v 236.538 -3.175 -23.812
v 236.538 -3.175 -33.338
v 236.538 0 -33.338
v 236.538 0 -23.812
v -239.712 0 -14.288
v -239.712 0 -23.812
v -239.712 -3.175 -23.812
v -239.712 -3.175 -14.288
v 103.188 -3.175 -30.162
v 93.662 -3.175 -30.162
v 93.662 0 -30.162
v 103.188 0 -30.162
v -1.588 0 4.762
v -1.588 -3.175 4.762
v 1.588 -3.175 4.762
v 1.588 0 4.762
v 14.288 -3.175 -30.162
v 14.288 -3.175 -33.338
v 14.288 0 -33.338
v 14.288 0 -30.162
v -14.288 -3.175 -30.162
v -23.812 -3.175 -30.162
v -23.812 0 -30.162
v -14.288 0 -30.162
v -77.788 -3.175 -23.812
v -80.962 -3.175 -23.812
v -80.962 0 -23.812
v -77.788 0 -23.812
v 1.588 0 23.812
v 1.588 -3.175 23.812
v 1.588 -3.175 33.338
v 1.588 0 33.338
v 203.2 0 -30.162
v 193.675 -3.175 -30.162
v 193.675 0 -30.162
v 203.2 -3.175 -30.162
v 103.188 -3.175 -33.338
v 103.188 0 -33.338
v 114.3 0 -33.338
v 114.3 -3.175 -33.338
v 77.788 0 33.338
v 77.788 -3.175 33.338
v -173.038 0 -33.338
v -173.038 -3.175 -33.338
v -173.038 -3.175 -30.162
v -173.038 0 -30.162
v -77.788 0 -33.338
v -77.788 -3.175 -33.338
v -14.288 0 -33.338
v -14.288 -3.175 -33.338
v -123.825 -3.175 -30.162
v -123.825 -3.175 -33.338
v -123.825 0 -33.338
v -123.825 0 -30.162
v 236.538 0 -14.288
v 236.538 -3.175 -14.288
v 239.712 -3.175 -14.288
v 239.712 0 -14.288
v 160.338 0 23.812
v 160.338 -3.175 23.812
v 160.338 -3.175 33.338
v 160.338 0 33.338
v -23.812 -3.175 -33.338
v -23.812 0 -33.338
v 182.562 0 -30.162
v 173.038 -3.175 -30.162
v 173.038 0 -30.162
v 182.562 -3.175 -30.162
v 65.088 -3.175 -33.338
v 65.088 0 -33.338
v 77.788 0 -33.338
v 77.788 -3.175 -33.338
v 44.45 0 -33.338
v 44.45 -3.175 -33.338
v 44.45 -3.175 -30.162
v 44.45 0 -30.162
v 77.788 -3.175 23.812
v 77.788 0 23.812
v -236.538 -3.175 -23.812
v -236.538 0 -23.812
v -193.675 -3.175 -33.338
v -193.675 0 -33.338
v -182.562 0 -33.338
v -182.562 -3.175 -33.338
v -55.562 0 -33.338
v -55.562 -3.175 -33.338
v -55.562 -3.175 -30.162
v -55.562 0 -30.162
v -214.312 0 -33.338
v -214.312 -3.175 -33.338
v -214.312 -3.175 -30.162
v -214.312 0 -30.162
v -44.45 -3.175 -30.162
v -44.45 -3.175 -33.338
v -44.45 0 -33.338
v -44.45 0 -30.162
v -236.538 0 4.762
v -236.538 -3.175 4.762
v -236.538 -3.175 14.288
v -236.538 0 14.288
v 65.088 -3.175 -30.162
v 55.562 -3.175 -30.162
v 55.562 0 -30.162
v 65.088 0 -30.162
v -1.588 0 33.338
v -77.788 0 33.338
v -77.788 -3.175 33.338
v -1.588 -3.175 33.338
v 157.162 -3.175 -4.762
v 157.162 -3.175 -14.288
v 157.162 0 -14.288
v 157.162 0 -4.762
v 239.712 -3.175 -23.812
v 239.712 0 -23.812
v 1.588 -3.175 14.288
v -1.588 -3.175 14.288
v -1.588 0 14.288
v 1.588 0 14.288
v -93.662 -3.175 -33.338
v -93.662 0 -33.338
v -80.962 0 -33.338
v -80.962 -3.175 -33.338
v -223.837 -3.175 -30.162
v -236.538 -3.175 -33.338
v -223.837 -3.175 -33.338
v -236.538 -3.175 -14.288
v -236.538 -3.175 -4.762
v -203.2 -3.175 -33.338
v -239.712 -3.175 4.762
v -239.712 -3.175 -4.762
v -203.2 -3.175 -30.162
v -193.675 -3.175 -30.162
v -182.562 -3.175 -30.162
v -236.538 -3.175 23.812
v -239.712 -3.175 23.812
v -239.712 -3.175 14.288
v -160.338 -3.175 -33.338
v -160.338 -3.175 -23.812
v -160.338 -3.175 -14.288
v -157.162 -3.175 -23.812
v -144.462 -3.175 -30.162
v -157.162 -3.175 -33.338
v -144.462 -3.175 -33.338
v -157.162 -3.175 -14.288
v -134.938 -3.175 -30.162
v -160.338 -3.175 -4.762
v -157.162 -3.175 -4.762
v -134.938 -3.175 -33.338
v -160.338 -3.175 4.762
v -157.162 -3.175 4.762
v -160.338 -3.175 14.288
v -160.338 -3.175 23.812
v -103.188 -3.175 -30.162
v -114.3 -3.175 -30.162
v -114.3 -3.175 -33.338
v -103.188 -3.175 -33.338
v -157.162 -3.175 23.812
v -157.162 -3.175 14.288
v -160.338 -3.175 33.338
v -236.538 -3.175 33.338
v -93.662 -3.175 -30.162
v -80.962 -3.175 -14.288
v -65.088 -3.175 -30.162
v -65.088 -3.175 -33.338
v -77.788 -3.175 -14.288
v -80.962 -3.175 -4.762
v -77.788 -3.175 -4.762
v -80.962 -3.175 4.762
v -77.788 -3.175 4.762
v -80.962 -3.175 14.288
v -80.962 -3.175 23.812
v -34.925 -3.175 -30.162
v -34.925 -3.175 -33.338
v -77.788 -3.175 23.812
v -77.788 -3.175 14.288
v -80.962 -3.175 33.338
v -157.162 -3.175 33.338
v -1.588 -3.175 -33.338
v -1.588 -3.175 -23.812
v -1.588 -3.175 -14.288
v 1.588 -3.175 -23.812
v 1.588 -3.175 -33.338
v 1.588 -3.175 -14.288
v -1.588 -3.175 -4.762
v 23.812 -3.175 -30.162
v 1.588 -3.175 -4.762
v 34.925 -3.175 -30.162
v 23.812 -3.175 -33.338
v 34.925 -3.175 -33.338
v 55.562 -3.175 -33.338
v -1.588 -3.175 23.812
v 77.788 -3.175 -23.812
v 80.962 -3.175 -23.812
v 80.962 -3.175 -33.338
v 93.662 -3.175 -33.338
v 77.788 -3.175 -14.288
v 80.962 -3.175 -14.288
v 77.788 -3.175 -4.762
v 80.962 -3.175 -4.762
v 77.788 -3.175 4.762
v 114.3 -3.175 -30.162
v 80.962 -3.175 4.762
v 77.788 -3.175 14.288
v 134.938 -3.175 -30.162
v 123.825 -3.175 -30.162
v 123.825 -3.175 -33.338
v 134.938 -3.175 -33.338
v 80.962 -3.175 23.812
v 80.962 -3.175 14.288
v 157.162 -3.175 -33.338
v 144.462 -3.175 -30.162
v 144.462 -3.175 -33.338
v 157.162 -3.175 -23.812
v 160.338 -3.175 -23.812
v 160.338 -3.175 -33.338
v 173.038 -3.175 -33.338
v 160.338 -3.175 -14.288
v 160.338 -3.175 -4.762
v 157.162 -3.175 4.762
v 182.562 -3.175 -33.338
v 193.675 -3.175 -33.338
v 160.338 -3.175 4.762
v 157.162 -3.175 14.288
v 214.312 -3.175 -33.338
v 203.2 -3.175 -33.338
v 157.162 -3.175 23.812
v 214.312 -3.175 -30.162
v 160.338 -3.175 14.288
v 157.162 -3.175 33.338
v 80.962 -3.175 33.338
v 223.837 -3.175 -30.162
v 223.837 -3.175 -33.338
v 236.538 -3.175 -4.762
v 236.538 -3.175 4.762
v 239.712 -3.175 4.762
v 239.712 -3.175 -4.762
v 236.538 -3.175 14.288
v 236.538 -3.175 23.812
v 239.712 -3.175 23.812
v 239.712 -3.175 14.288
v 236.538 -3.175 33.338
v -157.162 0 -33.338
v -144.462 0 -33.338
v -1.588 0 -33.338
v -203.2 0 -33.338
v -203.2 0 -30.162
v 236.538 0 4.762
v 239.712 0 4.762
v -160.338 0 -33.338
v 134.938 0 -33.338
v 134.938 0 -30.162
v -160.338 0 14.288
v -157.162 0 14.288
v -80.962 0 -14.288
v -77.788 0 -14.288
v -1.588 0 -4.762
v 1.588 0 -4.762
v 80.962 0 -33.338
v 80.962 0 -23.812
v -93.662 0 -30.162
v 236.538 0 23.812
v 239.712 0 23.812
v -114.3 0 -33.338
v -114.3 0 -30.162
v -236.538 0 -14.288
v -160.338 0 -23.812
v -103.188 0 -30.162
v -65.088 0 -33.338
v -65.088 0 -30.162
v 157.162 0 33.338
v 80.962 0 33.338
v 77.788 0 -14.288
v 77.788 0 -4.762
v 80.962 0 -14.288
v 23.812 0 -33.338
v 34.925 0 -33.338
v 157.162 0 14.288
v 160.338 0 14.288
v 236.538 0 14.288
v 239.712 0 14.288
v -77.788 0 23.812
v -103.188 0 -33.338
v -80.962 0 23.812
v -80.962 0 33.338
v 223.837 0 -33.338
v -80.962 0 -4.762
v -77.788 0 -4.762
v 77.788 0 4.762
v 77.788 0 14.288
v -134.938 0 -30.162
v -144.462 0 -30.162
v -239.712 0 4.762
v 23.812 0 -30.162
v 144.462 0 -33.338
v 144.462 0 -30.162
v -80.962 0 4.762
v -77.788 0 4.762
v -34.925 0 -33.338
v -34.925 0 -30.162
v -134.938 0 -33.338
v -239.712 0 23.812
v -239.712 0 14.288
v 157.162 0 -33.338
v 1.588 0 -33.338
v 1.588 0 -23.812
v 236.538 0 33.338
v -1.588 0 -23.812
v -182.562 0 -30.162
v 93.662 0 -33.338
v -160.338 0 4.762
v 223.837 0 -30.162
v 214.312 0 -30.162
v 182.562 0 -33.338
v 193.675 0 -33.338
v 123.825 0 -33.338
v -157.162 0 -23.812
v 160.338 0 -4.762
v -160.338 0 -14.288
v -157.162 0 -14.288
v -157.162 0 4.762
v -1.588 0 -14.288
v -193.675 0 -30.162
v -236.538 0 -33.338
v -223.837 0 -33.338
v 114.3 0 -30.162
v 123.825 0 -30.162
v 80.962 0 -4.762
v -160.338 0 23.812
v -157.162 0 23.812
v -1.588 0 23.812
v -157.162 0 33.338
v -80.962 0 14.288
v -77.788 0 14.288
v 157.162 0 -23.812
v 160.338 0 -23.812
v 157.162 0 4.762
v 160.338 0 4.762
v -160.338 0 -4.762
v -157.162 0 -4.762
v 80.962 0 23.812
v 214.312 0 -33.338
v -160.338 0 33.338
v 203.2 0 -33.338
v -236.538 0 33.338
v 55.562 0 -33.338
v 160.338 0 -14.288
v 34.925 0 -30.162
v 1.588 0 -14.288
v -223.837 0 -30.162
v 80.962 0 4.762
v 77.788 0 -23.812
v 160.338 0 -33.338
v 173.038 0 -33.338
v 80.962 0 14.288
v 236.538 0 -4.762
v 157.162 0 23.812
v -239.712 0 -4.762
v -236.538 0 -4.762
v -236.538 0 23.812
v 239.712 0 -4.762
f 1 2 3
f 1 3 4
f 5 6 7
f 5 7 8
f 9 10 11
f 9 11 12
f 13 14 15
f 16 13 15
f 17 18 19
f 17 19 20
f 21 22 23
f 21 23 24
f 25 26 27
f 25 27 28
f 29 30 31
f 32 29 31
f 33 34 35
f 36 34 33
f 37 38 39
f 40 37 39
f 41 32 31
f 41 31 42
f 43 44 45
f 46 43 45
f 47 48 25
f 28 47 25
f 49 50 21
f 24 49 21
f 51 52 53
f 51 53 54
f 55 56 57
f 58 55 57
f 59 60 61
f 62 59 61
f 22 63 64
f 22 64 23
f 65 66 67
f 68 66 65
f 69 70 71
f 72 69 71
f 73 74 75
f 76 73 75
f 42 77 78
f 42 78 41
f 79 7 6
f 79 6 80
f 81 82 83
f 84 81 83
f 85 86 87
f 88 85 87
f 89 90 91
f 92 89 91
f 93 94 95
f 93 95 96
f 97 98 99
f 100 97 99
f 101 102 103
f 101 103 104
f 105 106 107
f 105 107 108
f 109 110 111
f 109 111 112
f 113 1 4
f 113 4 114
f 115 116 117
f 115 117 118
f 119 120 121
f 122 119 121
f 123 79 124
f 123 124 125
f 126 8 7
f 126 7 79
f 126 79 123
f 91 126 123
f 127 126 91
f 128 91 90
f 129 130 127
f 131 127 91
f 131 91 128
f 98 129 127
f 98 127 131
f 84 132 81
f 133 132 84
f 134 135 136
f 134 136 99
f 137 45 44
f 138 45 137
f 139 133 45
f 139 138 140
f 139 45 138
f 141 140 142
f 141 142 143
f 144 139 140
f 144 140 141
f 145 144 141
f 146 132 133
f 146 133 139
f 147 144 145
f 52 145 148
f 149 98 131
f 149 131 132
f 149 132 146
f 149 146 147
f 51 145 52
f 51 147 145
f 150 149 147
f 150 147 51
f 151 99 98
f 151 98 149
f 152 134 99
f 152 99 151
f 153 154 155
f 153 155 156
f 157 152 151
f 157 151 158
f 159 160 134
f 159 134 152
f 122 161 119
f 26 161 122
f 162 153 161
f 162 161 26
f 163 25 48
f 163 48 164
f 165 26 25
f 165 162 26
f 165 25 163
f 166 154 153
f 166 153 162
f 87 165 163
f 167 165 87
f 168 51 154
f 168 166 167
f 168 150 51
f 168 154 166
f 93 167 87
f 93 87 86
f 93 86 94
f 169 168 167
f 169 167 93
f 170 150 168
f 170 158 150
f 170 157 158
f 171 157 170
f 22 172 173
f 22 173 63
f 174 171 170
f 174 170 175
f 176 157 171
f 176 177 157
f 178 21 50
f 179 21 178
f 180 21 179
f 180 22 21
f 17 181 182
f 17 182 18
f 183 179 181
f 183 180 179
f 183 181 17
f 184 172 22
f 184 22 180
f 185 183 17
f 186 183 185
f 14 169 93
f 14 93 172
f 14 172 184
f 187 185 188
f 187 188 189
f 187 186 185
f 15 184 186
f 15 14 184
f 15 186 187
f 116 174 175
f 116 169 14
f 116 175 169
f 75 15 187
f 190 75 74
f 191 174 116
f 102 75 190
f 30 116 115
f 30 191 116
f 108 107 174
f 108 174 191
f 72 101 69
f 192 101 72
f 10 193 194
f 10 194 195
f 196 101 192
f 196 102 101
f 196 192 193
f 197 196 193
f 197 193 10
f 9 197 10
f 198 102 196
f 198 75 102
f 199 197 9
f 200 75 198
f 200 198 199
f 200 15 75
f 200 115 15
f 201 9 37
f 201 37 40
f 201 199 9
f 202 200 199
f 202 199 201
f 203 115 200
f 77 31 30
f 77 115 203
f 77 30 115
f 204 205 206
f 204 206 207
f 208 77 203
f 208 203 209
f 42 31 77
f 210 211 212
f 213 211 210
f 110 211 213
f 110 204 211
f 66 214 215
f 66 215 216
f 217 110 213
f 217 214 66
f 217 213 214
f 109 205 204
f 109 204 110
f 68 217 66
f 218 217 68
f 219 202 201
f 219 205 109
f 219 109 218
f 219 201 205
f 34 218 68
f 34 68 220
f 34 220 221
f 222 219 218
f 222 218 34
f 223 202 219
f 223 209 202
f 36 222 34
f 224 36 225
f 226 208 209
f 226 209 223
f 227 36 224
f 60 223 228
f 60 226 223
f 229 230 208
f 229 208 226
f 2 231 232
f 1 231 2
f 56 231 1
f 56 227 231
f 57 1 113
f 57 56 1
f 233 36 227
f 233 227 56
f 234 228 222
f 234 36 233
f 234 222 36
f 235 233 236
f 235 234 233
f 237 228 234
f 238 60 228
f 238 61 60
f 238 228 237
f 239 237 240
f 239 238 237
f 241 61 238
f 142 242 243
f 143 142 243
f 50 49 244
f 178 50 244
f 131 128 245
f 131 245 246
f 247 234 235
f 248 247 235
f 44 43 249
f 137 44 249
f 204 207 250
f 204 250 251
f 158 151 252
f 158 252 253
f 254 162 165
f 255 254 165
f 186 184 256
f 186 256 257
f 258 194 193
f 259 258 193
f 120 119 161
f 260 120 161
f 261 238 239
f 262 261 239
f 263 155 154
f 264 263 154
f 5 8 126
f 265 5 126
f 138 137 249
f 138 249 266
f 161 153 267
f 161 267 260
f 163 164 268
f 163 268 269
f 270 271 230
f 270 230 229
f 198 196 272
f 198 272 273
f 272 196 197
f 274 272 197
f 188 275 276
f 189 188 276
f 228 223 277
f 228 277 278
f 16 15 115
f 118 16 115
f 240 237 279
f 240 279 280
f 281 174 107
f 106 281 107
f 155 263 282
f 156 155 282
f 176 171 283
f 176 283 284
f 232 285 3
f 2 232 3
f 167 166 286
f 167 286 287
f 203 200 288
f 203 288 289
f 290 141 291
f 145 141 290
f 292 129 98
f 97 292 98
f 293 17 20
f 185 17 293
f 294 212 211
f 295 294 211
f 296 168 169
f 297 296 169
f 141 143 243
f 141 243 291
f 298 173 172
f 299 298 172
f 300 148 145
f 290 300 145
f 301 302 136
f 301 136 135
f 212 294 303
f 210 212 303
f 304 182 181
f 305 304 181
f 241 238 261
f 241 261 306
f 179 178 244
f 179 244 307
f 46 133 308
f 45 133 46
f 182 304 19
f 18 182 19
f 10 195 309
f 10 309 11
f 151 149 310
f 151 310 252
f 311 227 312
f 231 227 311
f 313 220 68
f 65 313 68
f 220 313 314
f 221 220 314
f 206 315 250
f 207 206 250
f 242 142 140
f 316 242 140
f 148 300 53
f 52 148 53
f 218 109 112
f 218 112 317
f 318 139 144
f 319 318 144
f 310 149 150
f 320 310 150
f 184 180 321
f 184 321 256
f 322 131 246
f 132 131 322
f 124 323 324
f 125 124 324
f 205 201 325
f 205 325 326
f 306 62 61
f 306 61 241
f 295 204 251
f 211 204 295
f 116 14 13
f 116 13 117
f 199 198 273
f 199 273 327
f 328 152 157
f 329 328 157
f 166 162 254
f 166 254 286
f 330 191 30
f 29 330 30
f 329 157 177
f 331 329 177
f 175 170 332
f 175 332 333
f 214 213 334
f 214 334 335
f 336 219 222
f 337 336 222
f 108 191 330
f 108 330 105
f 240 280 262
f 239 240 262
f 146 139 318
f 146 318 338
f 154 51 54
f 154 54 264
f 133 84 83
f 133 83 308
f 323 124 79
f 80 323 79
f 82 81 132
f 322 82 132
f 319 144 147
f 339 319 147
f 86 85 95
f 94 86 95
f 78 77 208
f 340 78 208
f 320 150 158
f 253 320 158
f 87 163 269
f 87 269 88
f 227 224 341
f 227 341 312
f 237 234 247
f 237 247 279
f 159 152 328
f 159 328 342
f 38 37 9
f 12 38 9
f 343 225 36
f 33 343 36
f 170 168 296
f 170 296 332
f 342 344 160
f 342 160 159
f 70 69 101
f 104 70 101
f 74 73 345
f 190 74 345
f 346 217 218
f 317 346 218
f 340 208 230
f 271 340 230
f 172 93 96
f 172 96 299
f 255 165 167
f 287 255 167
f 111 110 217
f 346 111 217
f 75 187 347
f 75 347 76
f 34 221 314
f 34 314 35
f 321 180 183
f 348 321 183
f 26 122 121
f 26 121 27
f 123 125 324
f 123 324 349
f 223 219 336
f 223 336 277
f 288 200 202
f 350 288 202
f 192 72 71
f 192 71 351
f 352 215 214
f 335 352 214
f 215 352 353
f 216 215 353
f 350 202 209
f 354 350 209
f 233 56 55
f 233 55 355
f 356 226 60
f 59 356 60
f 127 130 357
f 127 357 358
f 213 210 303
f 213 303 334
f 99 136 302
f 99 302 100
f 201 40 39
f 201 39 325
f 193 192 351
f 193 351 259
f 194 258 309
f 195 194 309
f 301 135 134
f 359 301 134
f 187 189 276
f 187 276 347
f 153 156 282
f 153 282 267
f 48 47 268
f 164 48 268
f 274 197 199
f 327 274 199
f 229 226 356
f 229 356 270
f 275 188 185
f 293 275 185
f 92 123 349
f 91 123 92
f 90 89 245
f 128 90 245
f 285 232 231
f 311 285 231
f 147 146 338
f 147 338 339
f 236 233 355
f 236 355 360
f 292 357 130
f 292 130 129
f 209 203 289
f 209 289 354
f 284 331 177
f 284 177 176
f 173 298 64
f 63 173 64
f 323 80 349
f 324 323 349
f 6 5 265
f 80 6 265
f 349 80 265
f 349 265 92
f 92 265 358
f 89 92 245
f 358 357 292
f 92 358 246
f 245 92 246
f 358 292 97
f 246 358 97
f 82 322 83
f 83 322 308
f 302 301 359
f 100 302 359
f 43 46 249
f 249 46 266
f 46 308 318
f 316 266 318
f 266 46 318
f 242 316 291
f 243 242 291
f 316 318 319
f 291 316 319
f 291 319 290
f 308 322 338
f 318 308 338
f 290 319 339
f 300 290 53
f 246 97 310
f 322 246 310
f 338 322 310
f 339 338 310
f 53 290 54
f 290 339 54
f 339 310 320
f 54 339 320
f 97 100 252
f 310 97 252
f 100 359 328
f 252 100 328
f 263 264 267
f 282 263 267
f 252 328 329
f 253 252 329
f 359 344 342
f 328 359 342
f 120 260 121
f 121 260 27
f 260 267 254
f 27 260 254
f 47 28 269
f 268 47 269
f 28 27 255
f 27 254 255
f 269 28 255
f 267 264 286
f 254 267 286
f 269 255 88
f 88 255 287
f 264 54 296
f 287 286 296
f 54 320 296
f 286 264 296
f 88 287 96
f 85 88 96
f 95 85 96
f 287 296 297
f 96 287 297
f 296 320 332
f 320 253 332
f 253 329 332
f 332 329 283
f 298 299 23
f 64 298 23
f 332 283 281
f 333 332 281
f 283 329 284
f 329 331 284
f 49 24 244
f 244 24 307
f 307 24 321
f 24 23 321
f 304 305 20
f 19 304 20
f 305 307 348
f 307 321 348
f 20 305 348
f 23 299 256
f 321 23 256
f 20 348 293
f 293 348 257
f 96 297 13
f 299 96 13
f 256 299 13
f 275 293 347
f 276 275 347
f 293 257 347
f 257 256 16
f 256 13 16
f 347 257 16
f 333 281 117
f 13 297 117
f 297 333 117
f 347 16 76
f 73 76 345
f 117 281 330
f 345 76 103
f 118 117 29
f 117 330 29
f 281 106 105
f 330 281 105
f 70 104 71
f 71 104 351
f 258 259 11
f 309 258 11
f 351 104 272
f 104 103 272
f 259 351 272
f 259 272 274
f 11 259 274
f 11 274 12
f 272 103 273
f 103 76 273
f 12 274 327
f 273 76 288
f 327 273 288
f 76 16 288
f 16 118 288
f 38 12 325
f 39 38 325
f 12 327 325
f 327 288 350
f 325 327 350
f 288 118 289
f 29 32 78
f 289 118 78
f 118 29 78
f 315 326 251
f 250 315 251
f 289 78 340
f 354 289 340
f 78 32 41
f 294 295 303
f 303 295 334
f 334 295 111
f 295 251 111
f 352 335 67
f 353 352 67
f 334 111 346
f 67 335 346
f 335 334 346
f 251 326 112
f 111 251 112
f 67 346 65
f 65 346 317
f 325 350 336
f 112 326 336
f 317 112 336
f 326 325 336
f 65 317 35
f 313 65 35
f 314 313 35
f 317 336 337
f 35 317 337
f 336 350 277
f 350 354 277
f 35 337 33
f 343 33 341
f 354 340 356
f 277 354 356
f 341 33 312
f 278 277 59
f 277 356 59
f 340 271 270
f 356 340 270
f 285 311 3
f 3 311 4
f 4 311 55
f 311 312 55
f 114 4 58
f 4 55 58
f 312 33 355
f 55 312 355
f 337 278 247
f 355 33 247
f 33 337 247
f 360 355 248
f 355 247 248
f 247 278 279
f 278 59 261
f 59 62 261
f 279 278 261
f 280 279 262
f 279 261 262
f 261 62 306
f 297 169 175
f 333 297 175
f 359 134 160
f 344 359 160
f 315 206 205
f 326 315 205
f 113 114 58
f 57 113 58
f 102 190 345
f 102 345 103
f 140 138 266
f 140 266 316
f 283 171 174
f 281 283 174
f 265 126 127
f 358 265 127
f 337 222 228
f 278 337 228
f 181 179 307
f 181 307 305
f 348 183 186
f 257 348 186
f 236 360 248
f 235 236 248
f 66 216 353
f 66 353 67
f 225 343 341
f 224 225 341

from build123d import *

# Parameters (mm, degrees)
F0_W     = 479.425
F0_H     = 66.675
F1_DEPTH = 3.175
F2_W     = 3.175
F2_H     = 9.525
F3_DEPTH = 3.176
F4_W     = 9.525
F4_H     = 3.175
F5_DEPTH = 3.176


with BuildPart() as f1:
    # F0 (on Front) → F1 (new body)
    with BuildSketch(Plane.XZ):
        Rectangle(F0_W, F0_H)
    extrude(amount=F1_DEPTH)

    # F2 (on face) → F3 (cut, through all)
    with BuildSketch(Plane.XZ.offset(3.175)):
        with Locations((-238.125, -28.575)):
            Rectangle(F2_W, F2_H)
        with Locations((-238.125, -9.525)):
            Rectangle(F2_W, F2_H)
        with Locations((-238.125, 9.525)):
            Rectangle(F2_W, F2_H)
        with Locations((-238.125, 28.575)):
            Rectangle(F2_W, F2_H)
        with Locations((-158.75, -28.575)):
            Rectangle(F2_W, F2_H)
        with Locations((-158.75, -9.525)):
            Rectangle(F2_W, F2_H)
        with Locations((-158.75, 9.525)):
            Rectangle(F2_W, F2_H)
        with Locations((-158.75, 28.575)):
            Rectangle(F2_W, F2_H)
        with Locations((-79.375, -28.575)):
            Rectangle(F2_W, F2_H)
        with Locations((-79.375, -9.525)):
            Rectangle(F2_W, F2_H)
        with Locations((-79.375, 9.525)):
            Rectangle(F2_W, F2_H)
        with Locations((-79.375, 28.575)):
            Rectangle(F2_W, F2_H)
        with Locations((0, -28.575)):
            Rectangle(F2_W, F2_H)
        with Locations((0, -9.525)):
            Rectangle(F2_W, F2_H)
        with Locations((0, 9.525)):
            Rectangle(F2_W, F2_H)
        with Locations((0, 28.575)):
            Rectangle(F2_W, F2_H)
        with Locations((79.375, -28.575)):
            Rectangle(F2_W, F2_H)
        with Locations((79.375, -9.525)):
            Rectangle(F2_W, F2_H)
        with Locations((79.375, 9.525)):
            Rectangle(F2_W, F2_H)
        with Locations((79.375, 28.575)):
            Rectangle(F2_W, F2_H)
        with Locations((158.75, -28.575)):
            Rectangle(F2_W, F2_H)
        with Locations((158.75, -9.525)):
            Rectangle(F2_W, F2_H)
        with Locations((158.75, 9.525)):
            Rectangle(F2_W, F2_H)
        with Locations((158.75, 28.575)):
            Rectangle(F2_W, F2_H)
        with Locations((238.125, -28.575)):
            Rectangle(F2_W, F2_H)
        with Locations((238.125, -9.525)):
            Rectangle(F2_W, F2_H)
        with Locations((238.125, 9.525)):
            Rectangle(F2_W, F2_H)
        with Locations((238.125, 28.575)):
            Rectangle(F2_W, F2_H)
    extrude(amount=-F3_DEPTH, mode=Mode.SUBTRACT)

    # F4 (on face) → F5 (cut, through all)
    with BuildSketch(Plane.XZ.offset(3.175)):
        with Locations((-219.075, -31.75)):
            Rectangle(F4_W, F4_H)
        with Locations((-198.4375, -31.75)):
            Rectangle(F4_W, F4_H)
        with Locations((-177.8, -31.75)):
            Rectangle(F4_W, F4_H)
        with Locations((-139.7, -31.75)):
            Rectangle(F4_W, F4_H)
        with Locations((-119.0625, -31.75)):
            Rectangle(F4_W, F4_H)
        with Locations((-98.425, -31.75)):
            Rectangle(F4_W, F4_H)
        with Locations((-60.325, -31.75)):
            Rectangle(F4_W, F4_H)
        with Locations((-39.6875, -31.75)):
            Rectangle(F4_W, F4_H)
        with Locations((-19.05, -31.75)):
            Rectangle(F4_W, F4_H)
        with Locations((19.05, -31.75)):
            Rectangle(F4_W, F4_H)
        with Locations((39.6875, -31.75)):
            Rectangle(F4_W, F4_H)
        with Locations((60.325, -31.75)):
            Rectangle(F4_W, F4_H)
        with Locations((98.425, -31.75)):
            Rectangle(F4_W, F4_H)
        with Locations((119.0625, -31.75)):
            Rectangle(F4_W, F4_H)
        with Locations((139.7, -31.75)):
            Rectangle(F4_W, F4_H)
        with Locations((177.8, -31.75)):
            Rectangle(F4_W, F4_H)
        with Locations((198.4375, -31.75)):
            Rectangle(F4_W, F4_H)
        with Locations((219.075, -31.75)):
            Rectangle(F4_W, F4_H)
    extrude(amount=-F5_DEPTH, mode=Mode.SUBTRACT)


solid = f1.part
